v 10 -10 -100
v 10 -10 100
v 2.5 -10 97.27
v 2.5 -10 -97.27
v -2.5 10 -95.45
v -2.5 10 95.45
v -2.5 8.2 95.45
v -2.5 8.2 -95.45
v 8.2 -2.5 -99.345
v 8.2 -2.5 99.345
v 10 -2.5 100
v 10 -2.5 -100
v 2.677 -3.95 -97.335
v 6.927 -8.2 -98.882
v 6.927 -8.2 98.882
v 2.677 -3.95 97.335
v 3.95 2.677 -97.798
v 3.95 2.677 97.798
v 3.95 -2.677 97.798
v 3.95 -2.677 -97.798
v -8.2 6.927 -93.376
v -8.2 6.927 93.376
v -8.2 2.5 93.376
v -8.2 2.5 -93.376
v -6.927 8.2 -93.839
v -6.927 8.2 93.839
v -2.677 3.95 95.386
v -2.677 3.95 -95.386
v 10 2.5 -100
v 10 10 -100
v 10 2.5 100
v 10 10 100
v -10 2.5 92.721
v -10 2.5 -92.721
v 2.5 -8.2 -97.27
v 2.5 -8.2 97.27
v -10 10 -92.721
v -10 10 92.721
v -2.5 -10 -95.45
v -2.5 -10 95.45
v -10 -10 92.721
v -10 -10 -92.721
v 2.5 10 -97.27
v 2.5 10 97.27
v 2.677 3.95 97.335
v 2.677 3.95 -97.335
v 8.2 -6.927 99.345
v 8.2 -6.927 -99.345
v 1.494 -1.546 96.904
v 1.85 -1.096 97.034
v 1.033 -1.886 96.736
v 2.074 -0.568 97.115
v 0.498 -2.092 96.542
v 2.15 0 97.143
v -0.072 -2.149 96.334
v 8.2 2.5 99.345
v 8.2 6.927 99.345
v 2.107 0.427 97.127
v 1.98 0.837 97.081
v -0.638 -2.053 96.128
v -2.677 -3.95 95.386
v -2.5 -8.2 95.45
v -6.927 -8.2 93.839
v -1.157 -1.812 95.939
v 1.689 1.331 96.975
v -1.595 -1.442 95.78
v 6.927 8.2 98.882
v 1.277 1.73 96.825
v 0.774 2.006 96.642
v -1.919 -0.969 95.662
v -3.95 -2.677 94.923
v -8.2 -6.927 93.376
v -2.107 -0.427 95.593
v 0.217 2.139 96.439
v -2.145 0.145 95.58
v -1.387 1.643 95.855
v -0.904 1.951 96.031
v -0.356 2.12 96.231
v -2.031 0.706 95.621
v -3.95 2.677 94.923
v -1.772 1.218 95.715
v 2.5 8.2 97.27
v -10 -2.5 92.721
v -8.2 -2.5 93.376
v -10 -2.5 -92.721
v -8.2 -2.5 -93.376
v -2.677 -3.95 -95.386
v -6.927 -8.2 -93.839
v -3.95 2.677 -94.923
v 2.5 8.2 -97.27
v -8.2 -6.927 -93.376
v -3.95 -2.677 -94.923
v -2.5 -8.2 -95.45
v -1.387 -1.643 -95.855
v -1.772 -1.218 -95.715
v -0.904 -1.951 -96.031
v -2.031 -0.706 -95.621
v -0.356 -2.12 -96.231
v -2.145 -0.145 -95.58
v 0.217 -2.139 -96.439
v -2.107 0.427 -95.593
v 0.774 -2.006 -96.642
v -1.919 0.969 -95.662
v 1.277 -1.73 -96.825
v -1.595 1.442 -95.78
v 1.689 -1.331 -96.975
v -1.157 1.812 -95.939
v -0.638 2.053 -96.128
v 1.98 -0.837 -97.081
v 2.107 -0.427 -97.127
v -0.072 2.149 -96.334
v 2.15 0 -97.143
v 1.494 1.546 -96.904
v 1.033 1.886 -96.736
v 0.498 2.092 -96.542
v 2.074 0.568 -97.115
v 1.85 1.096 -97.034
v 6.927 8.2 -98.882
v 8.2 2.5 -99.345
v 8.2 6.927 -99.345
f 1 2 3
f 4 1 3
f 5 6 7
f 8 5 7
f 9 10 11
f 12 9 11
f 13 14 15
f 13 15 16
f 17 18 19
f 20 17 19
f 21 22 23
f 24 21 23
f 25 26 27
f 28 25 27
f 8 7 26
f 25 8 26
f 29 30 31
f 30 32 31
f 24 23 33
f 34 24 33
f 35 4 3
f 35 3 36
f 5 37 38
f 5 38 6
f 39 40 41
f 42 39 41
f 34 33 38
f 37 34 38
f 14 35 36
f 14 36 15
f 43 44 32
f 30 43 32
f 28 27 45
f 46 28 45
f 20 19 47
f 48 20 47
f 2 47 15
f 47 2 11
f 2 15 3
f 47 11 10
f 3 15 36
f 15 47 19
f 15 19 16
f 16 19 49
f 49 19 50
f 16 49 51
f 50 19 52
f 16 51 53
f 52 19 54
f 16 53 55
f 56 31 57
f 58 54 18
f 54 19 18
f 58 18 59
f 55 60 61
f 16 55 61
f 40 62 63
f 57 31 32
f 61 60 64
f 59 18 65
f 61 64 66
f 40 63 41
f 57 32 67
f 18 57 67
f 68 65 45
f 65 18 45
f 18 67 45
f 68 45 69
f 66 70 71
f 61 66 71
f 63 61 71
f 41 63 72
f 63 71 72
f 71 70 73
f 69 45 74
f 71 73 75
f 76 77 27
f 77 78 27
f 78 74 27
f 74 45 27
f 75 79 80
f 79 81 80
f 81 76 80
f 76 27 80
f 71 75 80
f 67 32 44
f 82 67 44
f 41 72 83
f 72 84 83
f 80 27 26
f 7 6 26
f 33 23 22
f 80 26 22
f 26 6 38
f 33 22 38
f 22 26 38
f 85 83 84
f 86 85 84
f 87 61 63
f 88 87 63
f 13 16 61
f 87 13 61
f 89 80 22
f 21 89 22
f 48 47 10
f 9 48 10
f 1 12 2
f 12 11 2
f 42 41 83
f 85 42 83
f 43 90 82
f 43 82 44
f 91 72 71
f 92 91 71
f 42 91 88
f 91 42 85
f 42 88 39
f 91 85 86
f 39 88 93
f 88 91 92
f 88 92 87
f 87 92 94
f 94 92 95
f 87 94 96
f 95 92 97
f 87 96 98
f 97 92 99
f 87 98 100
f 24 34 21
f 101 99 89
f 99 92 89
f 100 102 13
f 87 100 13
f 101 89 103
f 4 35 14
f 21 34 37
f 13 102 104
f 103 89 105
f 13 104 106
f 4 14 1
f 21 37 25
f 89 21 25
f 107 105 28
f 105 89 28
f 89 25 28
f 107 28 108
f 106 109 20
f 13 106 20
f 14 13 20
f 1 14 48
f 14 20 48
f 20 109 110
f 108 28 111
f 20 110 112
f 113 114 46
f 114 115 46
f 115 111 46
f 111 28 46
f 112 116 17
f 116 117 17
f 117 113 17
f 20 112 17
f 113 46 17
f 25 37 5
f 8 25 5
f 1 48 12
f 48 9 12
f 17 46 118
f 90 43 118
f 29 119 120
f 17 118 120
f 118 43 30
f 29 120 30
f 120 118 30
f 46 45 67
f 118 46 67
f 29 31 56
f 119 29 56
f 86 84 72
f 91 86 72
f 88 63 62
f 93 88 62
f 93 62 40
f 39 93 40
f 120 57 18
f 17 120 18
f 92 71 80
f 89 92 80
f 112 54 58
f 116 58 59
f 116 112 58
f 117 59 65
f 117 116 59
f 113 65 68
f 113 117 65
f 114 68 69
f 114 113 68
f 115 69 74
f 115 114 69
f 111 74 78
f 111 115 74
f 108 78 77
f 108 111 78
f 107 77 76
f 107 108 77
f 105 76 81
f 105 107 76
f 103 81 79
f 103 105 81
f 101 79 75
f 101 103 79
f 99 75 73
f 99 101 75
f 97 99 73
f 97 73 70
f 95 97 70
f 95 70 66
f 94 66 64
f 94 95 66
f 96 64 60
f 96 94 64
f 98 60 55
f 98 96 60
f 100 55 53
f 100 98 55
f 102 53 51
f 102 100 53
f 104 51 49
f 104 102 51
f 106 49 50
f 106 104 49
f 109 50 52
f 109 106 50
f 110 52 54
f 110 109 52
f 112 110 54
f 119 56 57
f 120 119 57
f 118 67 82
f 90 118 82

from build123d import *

# Parameters (mm, degrees)
SKETCH2_R           = 2.15
BOSS_EXTRUDE1_DEPTH = 100
CUT_EXTRUDE1_DEPTH  = 21
CUT_EXTRUDE2_DEPTH  = 21


with BuildPart() as part:
    # Sketch2 → Boss-Extrude1 (new body, symmetric)
    with BuildSketch(Plane.XY):
        Polygon((-2.5, 10), (-2.5, 8.2), (-6.927207794, 8.2), (-2.677207794, 3.95), (2.677207794, 3.95), (6.927207794, 8.2), (2.5, 8.2), (2.5, 10), (10, 10), (10, 2.5), (8.2, 2.5), (8.2, 6.927207794), (3.95, 2.677207794), (3.95, -2.677207794), (8.2, -6.927207794), (8.2, -2.5), (10, -2.5), (10, -10), (2.5, -10), (2.5, -8.2), (6.927207794, -8.2), (2.677207794, -3.95), (-2.677207794, -3.95), (-6.927207794, -8.2), (-2.5, -8.2), (-2.5, -10), (-10, -10), (-10, -2.5), (-8.2, -2.5), (-8.2, -6.927207794), (-3.95, -2.677207794), (-3.95, 2.677207794), (-8.2, 6.927207794), (-8.2, 2.5), (-10, 2.5), (-10, 10), align=None)
        Circle(SKETCH2_R, mode=Mode.SUBTRACT)
    extrude(amount=BOSS_EXTRUDE1_DEPTH, both=True)

    # Sketch3 → Cut-Extrude1 (cut, through all)
    with BuildSketch(Plane(origin=(0, 10, 0), x_dir=(1, 0, 0), z_dir=(0, 1, 0))):
        Polygon((-10, -100), (10, -100), (-10, -92.720595315), align=None)
    extrude(amount=-CUT_EXTRUDE1_DEPTH, mode=Mode.SUBTRACT)

    # Sketch4 → Cut-Extrude2 (cut, through all)
    with BuildSketch(Plane(origin=(0, 10, 0), x_dir=(1, 0, 0), z_dir=(0, 1, 0))):
        Polygon((10, 100), (-10, 100), (-10, 92.720595315), align=None)
    extrude(amount=-CUT_EXTRUDE2_DEPTH, mode=Mode.SUBTRACT)


solid = part.part
